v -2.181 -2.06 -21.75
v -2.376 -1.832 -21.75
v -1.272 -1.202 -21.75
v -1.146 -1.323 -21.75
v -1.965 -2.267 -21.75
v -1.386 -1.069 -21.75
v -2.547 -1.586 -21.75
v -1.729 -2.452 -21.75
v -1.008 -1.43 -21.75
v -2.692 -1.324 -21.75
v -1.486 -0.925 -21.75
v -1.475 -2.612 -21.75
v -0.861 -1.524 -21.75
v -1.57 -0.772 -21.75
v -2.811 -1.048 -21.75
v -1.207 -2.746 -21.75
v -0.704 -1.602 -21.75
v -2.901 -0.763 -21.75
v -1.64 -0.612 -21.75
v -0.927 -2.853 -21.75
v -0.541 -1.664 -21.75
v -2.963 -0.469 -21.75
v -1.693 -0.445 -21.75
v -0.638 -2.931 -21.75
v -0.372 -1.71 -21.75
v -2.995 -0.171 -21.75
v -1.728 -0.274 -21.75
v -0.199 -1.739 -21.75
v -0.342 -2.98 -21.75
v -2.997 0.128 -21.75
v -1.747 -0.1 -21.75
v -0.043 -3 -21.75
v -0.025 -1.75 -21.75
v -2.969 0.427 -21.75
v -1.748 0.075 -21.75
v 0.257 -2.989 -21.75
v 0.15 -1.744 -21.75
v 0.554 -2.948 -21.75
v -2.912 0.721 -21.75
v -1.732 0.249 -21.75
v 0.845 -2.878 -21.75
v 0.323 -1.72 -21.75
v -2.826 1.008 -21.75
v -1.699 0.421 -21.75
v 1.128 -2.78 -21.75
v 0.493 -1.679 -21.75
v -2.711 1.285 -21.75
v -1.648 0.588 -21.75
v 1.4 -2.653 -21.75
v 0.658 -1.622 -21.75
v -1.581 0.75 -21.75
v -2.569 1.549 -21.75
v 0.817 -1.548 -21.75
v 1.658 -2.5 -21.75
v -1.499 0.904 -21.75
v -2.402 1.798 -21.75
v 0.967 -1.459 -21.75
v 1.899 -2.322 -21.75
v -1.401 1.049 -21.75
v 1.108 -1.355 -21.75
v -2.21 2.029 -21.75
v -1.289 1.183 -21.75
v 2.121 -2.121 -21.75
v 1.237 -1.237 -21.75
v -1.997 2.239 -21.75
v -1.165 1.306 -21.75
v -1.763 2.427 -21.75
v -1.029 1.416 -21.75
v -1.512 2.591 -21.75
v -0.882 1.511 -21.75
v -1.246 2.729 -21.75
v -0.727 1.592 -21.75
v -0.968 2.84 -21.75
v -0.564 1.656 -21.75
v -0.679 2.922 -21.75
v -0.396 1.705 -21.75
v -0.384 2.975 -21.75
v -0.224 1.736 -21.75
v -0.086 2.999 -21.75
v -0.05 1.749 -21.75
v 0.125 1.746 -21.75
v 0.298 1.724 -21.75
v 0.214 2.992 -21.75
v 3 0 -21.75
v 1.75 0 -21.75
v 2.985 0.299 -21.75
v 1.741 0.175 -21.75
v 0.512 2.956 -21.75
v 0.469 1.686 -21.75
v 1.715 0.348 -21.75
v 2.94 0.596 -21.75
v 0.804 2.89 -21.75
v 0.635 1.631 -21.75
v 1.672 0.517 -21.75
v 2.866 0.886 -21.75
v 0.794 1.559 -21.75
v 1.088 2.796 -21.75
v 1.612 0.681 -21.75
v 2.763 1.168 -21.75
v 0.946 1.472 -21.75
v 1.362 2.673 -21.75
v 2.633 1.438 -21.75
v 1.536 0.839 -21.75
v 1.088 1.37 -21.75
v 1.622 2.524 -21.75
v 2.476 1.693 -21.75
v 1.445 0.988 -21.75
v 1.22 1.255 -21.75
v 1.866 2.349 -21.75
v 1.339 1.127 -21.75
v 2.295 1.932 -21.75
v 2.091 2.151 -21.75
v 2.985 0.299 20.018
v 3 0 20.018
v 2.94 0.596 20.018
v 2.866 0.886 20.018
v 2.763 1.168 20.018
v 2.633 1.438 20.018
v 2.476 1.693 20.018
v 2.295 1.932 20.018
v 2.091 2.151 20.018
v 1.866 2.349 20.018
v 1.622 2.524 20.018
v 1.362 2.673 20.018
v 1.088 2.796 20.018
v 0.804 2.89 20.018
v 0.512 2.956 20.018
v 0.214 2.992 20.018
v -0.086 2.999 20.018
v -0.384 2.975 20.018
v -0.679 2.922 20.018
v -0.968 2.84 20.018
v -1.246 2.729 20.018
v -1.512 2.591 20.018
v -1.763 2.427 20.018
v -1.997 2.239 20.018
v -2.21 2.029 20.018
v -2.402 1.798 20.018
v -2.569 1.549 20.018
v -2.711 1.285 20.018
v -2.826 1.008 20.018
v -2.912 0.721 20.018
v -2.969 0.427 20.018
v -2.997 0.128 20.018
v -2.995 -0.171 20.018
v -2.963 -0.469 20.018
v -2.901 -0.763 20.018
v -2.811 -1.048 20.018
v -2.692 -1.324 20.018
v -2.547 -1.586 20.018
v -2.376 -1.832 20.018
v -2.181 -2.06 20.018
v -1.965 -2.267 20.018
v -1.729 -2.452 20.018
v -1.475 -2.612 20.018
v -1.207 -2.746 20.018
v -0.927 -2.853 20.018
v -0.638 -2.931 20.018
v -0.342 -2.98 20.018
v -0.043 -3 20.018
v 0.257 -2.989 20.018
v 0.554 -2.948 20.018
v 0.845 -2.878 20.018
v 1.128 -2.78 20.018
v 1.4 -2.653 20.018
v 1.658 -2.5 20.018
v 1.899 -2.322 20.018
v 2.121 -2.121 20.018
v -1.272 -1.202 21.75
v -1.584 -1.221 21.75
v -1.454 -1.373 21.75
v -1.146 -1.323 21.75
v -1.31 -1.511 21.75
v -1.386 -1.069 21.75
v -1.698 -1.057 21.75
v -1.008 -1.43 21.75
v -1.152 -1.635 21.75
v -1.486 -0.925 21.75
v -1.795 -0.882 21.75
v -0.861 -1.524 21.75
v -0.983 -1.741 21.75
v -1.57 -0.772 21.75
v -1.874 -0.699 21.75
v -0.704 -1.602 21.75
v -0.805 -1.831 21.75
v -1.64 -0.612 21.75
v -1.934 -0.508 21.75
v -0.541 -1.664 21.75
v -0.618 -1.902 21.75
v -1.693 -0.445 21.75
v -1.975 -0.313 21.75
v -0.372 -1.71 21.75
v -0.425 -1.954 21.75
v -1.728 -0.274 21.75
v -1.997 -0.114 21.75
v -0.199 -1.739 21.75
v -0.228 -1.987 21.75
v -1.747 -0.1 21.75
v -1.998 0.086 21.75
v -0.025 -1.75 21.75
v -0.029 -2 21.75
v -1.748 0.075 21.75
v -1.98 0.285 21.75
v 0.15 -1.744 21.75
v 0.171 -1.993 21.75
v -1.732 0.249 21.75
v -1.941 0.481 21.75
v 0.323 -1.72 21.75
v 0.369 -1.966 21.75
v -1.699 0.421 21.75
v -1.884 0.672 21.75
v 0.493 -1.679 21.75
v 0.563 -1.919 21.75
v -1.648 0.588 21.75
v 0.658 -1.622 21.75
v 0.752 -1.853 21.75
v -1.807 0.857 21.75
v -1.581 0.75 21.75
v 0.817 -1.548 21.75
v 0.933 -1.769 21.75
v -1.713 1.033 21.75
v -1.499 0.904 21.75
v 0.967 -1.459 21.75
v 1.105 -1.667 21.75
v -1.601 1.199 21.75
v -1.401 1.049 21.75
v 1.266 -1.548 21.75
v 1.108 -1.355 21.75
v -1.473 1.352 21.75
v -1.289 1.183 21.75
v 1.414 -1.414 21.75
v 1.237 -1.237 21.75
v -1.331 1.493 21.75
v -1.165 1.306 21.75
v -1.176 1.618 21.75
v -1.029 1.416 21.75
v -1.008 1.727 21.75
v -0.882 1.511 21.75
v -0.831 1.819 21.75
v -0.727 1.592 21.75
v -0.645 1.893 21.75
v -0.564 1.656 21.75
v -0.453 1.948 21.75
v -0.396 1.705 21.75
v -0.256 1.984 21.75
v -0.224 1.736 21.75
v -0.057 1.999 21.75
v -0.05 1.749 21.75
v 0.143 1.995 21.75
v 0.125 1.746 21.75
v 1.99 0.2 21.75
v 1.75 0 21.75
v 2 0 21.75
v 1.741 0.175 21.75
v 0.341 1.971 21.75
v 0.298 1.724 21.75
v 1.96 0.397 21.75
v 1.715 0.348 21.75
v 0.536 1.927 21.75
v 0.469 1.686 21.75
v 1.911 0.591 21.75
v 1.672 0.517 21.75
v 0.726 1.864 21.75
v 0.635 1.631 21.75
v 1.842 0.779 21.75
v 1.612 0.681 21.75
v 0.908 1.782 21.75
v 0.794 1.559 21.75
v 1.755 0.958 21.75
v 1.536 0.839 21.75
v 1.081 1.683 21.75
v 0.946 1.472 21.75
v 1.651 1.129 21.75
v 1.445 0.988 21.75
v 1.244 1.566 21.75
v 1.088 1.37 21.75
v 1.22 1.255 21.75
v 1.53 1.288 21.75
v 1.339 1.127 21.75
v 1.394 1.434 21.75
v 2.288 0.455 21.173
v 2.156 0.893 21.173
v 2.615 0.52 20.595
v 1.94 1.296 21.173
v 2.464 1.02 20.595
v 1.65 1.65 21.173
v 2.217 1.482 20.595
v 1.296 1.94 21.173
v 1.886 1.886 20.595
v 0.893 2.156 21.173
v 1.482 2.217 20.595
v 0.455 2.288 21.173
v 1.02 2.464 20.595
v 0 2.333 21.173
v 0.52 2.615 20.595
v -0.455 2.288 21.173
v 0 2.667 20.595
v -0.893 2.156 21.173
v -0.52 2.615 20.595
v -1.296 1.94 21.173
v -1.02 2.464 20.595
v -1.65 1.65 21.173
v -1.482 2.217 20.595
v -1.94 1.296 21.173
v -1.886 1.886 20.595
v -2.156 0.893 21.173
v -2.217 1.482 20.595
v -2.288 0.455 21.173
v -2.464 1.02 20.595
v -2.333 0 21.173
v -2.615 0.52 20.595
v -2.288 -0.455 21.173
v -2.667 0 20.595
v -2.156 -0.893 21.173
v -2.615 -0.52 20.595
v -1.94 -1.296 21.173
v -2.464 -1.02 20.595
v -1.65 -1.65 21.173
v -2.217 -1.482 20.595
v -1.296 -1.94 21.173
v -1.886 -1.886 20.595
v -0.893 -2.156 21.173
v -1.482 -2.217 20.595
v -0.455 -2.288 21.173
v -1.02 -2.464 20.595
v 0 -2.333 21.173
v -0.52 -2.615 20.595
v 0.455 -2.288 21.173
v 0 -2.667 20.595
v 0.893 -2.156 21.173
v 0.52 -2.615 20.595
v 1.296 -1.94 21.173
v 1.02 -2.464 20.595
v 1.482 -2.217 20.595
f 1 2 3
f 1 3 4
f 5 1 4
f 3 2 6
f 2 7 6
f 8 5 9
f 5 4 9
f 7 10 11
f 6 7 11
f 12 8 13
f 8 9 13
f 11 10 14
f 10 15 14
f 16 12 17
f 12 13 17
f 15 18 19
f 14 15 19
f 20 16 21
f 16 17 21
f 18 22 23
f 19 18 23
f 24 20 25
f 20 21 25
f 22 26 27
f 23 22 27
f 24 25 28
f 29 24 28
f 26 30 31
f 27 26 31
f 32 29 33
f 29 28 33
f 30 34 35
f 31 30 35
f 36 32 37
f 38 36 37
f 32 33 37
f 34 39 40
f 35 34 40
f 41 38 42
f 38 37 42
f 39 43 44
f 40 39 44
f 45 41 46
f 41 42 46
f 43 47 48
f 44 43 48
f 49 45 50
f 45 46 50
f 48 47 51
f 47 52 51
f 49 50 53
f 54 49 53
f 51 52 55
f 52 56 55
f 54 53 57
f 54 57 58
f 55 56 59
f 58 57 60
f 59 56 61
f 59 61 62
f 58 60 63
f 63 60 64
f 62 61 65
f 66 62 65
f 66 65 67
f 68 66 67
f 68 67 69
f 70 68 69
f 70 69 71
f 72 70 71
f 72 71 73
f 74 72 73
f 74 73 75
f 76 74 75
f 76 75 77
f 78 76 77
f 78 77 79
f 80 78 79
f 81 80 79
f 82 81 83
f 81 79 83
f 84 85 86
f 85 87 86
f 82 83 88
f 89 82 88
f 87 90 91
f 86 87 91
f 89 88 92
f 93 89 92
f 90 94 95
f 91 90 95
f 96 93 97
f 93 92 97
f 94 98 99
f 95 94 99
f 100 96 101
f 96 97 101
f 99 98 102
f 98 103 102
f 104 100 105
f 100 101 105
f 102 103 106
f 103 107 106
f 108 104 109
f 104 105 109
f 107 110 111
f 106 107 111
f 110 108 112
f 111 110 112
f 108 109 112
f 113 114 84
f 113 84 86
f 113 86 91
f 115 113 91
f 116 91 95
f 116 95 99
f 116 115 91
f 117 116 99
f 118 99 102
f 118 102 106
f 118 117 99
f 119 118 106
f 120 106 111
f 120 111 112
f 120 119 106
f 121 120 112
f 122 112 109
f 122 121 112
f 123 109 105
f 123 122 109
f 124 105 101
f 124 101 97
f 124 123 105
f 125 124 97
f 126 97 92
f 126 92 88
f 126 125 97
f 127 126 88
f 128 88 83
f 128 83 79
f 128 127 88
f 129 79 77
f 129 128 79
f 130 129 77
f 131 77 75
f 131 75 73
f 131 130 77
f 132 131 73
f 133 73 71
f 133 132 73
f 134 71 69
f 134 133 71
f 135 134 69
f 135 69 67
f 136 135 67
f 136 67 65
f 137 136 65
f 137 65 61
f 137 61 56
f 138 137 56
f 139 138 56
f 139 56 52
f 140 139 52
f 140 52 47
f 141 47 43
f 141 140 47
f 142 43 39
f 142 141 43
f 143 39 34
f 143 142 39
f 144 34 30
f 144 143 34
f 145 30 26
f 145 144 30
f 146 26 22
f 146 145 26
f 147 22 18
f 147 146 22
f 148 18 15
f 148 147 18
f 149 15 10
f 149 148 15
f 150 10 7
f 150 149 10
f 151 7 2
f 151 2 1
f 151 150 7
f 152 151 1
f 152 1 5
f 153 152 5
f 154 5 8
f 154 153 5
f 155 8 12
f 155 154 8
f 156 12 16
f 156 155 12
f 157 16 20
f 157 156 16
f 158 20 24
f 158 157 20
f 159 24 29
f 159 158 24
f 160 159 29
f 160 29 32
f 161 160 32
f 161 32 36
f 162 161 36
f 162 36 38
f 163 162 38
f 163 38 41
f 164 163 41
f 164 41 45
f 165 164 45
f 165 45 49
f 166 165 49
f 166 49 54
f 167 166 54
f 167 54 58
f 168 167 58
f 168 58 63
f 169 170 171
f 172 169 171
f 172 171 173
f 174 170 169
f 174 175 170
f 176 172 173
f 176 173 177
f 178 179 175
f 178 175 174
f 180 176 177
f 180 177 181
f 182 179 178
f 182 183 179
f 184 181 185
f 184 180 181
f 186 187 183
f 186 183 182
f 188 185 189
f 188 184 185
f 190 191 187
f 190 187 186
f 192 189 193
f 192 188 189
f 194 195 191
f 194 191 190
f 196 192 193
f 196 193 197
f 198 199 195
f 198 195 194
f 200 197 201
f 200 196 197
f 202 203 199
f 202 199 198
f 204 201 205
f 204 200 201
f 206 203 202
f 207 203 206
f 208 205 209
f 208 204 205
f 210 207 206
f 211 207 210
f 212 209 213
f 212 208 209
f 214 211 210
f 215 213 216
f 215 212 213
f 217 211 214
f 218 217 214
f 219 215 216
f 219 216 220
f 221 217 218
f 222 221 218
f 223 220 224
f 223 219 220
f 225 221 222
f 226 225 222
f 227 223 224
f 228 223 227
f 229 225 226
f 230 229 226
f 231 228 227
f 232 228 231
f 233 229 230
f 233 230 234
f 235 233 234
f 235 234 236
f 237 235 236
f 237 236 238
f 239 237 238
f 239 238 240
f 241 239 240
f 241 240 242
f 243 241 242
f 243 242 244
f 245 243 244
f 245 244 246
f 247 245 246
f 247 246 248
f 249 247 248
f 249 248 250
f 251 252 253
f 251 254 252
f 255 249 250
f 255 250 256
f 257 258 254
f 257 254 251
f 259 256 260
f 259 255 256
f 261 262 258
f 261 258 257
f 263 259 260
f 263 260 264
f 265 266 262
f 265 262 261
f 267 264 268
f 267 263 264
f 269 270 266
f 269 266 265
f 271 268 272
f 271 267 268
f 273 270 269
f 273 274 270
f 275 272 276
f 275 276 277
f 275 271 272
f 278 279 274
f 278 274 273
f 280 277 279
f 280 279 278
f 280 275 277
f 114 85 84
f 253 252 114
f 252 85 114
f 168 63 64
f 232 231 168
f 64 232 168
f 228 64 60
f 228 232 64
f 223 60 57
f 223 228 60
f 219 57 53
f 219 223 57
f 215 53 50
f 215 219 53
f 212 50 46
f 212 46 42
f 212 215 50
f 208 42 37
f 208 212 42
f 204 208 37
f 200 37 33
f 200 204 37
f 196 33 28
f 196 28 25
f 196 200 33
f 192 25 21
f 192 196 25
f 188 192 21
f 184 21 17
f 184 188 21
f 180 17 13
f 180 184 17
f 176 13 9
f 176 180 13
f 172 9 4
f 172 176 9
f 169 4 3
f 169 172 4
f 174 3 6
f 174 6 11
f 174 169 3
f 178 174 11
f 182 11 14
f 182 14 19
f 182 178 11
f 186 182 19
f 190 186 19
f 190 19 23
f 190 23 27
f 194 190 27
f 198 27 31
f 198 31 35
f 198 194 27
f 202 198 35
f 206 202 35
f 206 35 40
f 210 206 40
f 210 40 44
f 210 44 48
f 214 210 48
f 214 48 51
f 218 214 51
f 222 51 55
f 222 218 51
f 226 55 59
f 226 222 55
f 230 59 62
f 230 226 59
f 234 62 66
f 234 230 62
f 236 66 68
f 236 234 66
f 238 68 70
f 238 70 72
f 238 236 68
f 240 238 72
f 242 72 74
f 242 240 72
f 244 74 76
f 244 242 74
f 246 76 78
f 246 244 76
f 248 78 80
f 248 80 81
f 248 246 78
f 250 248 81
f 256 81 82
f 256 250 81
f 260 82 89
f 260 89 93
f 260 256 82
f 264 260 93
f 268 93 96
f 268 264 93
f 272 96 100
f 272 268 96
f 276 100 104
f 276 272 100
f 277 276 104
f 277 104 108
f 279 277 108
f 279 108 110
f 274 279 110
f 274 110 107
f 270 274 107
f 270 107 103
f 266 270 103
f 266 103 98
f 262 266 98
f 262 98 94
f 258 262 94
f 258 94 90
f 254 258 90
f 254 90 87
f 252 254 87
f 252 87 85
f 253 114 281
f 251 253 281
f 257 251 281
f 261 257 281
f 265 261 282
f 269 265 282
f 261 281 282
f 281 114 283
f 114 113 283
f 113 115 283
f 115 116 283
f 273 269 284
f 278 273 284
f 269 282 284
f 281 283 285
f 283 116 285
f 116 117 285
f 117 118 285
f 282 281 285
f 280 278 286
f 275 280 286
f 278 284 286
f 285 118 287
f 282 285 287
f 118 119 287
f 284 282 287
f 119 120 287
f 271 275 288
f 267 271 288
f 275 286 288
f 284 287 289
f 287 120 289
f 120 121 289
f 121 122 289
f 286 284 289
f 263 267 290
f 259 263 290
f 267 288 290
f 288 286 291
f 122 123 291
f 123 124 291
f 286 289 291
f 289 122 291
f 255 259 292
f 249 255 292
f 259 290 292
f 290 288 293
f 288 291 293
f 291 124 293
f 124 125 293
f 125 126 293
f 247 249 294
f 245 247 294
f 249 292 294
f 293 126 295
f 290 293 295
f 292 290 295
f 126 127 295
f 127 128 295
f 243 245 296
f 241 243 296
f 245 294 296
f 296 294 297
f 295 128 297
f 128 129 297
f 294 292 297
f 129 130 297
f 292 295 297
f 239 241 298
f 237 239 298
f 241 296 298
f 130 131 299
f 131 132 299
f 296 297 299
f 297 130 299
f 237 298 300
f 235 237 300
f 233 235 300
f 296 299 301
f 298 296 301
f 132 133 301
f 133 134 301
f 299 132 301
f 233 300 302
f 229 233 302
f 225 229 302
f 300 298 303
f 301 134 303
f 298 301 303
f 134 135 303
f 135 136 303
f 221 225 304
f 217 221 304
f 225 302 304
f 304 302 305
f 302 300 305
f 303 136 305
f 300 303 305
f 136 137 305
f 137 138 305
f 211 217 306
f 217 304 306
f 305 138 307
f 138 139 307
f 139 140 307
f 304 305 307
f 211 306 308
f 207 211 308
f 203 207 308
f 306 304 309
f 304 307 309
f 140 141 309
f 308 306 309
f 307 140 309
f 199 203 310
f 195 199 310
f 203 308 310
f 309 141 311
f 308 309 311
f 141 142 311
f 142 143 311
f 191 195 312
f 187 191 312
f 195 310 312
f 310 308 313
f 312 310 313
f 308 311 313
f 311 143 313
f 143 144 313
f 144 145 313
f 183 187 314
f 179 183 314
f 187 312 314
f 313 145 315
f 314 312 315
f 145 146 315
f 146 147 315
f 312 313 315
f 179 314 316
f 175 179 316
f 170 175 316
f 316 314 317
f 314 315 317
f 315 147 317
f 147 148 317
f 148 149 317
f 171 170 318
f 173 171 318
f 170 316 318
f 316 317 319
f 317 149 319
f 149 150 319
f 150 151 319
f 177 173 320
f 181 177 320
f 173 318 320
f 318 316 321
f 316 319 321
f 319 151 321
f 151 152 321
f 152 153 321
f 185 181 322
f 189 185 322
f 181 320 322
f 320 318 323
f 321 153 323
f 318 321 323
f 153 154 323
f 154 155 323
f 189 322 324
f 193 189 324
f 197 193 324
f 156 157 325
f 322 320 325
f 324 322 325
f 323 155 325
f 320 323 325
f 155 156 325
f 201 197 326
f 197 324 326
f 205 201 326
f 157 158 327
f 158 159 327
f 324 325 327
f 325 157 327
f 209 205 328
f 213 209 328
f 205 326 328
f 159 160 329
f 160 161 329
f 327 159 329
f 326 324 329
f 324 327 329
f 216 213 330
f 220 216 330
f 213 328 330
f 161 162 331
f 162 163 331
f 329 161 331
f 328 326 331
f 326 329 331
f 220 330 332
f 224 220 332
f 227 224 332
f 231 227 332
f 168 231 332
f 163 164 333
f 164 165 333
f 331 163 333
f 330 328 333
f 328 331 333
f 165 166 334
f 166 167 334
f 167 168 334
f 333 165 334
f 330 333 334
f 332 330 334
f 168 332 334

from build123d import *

# Parameters (mm, degrees)
F1_DEPTH = 21.75
F2_SIZE2 = 1.7320508076
F2_SIZE  = 1


with BuildPart() as f1:
    # F0 (on Top) → F1 (new body, symmetric)
    with BuildSketch(Plane.XY):
        with BuildLine():
            Line((1.75, 0), (3, 0))
            ThreePointArc((3, 0), (-2.7716385975, 1.1480502971), (2.1213203436, -2.1213203436))
            Line((2.1213203436, -2.1213203436), (1.2374368671, -1.2374368671))
            ThreePointArc((1.2374368671, -1.2374368671), (-1.6167891819, 0.6696960066), (1.75, 0))
        make_face()
    extrude(amount=F1_DEPTH, both=True)

    # F2
    f2_edges = [f1.edges().sort_by_distance(p)[0] for p in [
        (-2.771639, 1.14805, 21.75),
    ]]
    f2_side = f1.faces().sort_by_distance((-1.695183, 0.702168, 21.75))[0]
    chamfer(f2_edges, length=F2_SIZE, length2=F2_SIZE2, reference=f2_side)


solid = f1.part
